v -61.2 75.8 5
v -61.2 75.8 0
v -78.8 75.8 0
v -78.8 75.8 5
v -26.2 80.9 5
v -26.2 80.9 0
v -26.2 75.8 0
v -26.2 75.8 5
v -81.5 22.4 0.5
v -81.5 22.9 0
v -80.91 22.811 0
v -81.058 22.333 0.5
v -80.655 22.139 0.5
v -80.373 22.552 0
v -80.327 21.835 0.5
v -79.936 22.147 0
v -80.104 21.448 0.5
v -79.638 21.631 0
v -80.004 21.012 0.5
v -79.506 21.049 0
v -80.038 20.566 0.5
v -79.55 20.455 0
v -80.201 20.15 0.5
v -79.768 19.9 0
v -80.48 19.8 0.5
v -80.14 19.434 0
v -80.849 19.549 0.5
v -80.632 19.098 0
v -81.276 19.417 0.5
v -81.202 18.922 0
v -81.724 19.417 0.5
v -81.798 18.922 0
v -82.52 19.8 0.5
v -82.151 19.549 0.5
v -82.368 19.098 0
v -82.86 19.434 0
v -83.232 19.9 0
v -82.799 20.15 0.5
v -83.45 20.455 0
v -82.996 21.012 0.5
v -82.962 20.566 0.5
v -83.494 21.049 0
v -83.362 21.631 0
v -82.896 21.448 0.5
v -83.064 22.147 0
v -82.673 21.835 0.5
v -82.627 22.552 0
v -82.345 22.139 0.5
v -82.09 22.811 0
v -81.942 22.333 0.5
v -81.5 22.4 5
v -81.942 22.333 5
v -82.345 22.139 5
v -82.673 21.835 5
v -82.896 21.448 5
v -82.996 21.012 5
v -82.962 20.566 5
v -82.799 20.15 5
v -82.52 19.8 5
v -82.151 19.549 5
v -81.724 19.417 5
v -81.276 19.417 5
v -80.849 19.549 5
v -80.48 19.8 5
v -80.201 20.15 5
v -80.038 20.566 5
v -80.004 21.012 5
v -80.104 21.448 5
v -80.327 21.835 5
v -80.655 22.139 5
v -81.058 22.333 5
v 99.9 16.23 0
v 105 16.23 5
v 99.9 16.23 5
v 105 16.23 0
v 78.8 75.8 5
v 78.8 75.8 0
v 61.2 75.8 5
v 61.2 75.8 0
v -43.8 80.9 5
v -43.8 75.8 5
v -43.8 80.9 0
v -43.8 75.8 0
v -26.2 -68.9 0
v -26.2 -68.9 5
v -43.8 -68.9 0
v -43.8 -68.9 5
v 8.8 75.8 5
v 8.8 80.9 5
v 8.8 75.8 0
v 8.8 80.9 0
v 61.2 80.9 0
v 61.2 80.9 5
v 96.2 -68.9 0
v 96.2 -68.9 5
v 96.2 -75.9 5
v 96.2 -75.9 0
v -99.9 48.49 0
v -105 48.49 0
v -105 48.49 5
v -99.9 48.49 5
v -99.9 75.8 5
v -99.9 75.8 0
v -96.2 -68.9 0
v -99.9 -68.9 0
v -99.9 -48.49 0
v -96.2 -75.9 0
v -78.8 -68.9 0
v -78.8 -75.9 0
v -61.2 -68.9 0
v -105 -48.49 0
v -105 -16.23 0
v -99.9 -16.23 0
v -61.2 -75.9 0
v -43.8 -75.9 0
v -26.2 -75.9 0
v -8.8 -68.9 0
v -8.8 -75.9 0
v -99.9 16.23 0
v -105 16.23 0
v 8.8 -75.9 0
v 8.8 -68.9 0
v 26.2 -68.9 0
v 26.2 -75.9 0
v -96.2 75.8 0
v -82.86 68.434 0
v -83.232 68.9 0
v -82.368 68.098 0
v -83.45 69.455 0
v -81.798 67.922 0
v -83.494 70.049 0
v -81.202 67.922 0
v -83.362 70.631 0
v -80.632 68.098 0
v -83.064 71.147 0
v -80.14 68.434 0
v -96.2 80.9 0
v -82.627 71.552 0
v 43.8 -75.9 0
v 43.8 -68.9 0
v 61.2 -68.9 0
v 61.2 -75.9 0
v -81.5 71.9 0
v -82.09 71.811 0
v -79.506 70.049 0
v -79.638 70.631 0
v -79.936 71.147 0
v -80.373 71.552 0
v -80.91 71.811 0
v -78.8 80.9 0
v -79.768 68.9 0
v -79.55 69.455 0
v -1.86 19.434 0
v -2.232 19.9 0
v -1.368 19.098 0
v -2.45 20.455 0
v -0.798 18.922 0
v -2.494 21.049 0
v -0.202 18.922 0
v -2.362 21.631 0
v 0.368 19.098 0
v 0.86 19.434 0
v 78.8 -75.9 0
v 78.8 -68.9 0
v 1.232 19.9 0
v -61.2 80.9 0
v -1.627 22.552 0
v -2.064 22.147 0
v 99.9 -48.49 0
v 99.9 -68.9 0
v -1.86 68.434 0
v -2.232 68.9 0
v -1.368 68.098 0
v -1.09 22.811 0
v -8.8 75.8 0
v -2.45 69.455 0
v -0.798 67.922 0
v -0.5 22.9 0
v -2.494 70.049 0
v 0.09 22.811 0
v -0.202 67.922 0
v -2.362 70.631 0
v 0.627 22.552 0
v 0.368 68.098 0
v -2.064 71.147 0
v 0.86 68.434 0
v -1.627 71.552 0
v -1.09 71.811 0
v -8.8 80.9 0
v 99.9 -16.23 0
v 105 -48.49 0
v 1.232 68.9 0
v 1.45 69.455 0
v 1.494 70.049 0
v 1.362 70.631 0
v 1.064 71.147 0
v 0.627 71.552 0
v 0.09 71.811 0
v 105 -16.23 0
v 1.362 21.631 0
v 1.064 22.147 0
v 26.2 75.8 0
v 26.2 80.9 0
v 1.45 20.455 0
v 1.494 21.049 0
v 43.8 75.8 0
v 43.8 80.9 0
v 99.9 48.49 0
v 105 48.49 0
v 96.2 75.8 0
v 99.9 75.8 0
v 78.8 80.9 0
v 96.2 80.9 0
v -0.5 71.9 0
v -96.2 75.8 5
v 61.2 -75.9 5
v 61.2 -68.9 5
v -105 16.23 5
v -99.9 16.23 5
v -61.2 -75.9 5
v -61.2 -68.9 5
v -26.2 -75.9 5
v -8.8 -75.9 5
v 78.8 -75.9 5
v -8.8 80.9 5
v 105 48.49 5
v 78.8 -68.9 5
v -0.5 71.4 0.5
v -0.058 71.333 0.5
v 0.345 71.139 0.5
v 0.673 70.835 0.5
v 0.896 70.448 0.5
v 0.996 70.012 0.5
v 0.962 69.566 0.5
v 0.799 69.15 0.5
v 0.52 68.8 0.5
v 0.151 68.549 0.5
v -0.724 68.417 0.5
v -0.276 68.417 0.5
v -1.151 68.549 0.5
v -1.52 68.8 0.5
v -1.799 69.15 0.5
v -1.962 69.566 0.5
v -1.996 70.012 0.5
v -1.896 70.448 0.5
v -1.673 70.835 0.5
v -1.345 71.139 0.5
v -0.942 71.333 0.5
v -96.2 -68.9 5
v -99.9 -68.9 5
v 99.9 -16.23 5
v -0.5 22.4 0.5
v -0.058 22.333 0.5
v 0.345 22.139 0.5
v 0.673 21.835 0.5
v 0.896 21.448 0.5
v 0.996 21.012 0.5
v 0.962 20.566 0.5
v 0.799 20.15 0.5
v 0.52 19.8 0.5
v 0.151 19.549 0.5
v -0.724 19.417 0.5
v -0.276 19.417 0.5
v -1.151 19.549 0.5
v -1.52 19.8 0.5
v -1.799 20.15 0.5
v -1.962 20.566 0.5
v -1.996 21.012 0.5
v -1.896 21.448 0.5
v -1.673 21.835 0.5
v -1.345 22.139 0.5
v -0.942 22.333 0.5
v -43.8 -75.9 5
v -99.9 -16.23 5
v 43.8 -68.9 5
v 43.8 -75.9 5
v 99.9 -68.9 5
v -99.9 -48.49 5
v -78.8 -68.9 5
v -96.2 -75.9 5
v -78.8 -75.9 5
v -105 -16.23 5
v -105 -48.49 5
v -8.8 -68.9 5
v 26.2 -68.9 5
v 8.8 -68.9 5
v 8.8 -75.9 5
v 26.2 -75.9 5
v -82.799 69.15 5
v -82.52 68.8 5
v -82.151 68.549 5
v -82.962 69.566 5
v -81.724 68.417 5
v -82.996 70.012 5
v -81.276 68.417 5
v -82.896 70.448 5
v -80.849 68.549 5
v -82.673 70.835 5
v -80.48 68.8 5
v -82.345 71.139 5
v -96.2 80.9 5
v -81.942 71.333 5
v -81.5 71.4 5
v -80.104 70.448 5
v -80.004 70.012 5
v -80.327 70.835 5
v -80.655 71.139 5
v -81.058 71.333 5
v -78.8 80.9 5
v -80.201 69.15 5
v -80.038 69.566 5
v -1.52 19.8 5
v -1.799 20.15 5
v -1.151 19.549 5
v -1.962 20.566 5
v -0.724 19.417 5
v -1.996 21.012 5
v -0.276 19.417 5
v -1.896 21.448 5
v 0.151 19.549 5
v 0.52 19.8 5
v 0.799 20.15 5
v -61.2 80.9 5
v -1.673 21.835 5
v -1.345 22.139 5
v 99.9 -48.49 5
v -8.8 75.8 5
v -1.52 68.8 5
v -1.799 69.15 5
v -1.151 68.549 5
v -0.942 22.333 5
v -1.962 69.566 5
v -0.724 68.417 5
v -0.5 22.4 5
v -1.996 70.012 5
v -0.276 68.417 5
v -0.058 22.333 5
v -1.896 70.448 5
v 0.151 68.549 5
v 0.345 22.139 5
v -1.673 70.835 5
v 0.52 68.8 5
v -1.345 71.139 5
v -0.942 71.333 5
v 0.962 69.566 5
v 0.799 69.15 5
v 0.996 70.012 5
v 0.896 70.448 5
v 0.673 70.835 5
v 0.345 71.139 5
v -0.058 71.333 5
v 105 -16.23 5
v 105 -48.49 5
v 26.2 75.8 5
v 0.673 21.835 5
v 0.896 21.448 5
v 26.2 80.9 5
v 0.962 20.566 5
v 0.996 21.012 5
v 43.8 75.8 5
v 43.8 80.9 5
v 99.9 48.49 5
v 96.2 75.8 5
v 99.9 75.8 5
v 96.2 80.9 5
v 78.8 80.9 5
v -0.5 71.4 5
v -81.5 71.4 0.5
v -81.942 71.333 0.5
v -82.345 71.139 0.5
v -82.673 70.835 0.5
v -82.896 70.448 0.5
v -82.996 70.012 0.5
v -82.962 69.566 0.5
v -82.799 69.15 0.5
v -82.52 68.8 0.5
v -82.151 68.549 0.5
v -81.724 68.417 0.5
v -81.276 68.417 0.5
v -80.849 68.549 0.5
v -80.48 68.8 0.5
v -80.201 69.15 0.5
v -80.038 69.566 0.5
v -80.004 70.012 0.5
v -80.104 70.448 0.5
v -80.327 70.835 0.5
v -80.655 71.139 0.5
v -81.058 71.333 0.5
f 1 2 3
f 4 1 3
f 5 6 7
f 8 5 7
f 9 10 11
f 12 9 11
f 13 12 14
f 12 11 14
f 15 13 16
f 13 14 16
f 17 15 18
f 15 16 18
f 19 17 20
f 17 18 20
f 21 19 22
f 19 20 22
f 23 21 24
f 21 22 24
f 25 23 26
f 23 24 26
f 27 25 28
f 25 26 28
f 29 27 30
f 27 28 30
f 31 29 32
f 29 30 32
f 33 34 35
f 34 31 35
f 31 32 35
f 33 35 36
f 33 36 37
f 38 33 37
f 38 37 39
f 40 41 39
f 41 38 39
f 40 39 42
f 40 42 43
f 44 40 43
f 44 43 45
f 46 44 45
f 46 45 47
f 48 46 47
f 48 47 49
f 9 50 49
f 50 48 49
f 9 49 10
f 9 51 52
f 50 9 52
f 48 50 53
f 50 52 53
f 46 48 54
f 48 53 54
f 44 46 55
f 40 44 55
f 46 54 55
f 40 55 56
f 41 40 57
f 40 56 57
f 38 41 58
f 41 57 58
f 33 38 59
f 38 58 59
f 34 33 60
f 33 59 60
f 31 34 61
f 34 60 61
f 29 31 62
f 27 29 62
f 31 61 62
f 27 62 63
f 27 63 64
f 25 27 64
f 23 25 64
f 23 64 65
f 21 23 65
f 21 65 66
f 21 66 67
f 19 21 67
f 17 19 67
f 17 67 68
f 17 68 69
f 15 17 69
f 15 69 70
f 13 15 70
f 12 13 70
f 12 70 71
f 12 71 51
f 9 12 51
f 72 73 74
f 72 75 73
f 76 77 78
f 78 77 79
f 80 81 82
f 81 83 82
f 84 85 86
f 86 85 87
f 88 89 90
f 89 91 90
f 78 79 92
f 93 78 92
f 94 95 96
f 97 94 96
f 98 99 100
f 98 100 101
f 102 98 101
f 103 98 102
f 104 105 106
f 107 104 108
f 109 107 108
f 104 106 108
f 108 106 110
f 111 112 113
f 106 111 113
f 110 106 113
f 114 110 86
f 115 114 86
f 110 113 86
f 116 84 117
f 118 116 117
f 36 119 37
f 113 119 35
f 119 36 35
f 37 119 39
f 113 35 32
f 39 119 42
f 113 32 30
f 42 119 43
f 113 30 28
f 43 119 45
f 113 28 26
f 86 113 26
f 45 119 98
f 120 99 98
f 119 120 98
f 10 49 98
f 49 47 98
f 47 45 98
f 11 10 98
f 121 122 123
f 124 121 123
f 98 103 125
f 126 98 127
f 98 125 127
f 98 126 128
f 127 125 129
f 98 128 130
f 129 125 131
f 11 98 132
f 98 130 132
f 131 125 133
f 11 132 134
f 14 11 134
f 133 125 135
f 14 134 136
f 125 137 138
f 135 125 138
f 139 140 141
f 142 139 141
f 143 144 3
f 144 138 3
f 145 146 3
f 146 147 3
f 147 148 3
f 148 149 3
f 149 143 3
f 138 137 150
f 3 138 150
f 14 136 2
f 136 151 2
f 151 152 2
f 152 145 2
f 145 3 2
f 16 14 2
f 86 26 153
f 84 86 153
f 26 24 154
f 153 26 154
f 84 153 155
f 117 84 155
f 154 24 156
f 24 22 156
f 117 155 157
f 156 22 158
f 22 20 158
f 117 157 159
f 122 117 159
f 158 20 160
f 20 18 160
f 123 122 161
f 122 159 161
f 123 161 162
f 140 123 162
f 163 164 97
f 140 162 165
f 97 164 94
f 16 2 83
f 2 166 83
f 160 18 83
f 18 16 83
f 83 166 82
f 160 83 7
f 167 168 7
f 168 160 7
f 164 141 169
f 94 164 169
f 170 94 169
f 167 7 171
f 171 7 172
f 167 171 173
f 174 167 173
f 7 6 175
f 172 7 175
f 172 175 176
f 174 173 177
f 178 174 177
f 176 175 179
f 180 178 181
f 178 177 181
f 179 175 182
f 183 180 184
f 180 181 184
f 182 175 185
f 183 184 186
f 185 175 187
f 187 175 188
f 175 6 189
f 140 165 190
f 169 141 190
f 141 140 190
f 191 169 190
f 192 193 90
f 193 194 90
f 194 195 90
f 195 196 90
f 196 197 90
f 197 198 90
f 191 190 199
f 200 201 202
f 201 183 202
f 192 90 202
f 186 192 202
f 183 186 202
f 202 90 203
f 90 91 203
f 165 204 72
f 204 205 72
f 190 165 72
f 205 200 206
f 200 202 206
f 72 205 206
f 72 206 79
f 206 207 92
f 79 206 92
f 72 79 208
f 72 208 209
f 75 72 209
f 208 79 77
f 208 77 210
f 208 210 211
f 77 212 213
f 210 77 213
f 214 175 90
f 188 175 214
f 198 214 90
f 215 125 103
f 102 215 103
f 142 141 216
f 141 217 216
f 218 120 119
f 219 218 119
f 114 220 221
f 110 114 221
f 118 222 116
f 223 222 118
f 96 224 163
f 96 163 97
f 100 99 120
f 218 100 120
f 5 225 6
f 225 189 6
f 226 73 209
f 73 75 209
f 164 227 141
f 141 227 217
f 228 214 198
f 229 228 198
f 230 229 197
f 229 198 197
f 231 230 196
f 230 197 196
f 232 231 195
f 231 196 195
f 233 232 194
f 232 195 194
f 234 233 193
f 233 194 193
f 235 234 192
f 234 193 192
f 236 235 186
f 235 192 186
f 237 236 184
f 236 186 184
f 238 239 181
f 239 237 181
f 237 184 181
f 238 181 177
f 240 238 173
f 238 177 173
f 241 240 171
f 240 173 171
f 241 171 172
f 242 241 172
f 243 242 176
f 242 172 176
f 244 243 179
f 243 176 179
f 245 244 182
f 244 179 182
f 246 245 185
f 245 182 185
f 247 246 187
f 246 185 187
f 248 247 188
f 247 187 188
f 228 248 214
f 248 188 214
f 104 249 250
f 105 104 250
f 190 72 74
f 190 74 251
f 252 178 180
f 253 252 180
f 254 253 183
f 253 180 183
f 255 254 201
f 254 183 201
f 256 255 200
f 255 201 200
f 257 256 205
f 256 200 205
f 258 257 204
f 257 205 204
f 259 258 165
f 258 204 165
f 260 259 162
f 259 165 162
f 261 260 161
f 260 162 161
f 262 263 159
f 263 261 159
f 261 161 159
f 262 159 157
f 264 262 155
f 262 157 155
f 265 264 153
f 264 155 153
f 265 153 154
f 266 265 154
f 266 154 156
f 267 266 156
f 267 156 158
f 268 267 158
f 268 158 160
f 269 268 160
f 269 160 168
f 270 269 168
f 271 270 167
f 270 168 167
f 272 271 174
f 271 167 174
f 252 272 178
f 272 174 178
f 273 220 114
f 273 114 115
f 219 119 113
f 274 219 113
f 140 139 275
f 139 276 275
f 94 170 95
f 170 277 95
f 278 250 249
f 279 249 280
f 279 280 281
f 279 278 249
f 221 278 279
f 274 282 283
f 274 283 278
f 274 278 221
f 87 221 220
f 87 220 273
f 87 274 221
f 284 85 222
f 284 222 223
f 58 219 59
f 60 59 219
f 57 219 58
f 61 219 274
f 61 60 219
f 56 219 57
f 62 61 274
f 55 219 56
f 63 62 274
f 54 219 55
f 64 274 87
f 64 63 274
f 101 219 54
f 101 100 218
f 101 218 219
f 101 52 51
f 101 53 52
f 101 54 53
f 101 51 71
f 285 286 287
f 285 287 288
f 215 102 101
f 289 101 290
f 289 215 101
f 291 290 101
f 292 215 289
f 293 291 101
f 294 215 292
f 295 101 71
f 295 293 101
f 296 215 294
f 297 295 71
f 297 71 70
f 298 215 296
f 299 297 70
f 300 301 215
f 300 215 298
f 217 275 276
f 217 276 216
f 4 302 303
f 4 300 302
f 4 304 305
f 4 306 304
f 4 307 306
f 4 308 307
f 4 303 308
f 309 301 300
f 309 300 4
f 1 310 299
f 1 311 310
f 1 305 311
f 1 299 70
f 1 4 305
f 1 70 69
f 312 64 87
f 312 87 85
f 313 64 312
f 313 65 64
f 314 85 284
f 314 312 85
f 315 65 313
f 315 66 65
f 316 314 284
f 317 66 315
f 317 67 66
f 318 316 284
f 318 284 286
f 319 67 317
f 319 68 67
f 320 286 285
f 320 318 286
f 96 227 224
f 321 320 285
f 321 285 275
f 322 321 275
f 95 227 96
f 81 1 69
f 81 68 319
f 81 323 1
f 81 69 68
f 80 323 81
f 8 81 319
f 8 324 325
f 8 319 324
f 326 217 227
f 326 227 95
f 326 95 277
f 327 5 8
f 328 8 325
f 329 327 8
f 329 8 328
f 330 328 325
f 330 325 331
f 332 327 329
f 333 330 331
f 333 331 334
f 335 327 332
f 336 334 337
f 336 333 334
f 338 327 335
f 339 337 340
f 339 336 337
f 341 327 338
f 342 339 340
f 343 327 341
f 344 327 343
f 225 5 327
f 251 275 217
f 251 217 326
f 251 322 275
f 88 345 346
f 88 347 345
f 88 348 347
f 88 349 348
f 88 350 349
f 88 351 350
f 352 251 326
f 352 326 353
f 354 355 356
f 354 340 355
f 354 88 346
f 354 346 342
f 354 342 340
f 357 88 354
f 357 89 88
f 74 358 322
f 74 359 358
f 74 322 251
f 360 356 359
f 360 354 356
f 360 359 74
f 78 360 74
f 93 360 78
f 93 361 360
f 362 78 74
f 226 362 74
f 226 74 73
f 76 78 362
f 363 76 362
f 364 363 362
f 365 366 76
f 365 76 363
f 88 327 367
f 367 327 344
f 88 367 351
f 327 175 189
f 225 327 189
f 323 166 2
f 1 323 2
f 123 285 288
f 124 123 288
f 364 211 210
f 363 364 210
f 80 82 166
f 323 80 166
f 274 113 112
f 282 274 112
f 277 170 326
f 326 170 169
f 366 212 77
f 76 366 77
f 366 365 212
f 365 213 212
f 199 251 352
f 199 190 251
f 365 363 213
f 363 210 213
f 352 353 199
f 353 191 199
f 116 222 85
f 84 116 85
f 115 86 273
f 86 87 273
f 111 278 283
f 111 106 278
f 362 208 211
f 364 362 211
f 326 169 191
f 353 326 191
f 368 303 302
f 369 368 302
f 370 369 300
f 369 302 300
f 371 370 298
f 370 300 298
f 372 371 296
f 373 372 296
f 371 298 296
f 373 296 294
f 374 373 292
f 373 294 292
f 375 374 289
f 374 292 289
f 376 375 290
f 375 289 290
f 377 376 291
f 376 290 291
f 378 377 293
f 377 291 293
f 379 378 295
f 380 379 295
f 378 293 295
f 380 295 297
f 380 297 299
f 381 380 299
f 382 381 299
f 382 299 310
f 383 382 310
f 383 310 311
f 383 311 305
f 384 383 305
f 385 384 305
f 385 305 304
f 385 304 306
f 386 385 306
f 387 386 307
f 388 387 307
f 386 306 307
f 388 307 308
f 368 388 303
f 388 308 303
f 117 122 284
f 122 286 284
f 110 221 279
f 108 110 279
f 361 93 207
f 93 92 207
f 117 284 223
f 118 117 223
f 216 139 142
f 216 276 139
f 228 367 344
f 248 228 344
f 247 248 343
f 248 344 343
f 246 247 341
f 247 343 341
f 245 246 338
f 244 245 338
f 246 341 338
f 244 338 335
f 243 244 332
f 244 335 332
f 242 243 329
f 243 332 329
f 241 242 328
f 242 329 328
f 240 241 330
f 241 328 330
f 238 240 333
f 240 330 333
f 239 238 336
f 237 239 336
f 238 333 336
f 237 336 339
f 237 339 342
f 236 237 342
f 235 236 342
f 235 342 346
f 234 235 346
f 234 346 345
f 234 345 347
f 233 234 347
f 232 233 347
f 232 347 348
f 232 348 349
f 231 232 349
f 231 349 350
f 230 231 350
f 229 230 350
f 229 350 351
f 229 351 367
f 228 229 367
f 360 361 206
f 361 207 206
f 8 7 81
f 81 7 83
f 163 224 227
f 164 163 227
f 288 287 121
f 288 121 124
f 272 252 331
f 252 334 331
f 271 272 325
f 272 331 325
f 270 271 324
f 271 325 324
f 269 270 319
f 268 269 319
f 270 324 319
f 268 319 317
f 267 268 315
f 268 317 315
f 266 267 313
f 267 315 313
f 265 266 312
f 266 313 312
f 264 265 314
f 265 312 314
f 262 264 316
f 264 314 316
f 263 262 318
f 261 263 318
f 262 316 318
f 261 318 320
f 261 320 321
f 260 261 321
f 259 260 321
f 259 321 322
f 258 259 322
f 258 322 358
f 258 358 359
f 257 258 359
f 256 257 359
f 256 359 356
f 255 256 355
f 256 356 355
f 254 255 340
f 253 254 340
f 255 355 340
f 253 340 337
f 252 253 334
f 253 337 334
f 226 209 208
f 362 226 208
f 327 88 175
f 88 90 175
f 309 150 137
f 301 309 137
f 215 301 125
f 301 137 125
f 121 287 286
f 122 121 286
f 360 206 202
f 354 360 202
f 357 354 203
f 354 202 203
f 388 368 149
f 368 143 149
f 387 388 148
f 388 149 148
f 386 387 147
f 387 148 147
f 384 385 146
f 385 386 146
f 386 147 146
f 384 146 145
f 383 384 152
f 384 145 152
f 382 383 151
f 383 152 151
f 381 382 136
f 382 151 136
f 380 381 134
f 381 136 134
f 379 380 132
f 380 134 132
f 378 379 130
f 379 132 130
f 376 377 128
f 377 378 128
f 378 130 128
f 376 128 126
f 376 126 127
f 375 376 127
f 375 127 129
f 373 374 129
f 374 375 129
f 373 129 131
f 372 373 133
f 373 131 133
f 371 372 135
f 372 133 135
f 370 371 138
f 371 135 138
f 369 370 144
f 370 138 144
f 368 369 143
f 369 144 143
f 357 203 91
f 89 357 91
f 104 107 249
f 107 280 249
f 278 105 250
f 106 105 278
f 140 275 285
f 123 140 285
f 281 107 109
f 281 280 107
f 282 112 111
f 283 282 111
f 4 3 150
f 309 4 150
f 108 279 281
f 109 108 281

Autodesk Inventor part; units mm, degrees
ref_plane "YZ Plane" through (0, 0, 0) normal (1, 0, 0) x (0, 1, 0)
ref_plane "XZ Plane" through (0, 0, 0) normal (0, 1, 0) x (-1, 0, 0)
ref_plane "XY Plane" through (0, 0, 0) normal (0, 0, 1) x (1, 0, 0)
sketch "Sketch1" plane through (0, 0, 0) normal (0, 0, 1) x (1, 0, 0)
  line L0 (-105, -80.9) -> (105, -80.9)
  line L1 (105, -80.9) -> (105, 80.9)
  line L2 (105, 80.9) -> (-105, 80.9)
  line L3 (-105, 80.9) -> (-105, -80.9)
  line L4 (-105, -80.9) -> (105, 80.9) construction
  line L5 (105, -80.9) -> (-105, 80.9) construction
  point P0 (0, 0)
  dimension "d0" = 210
  dimension "d1" = 161.8
extrude "Extrusion1" add sketch "Sketch1" along normal blind 5
sketch "Sketch3" plane through (0, 0, 0) normal (0, 0, -1) x (-1, 0, 0)
  line L0 (0.5, 69.9) -> (81.5, 69.9)
  line L1 (81.5, 69.9) -> (81.5, 20.9)
  line L2 (81.5, 20.9) -> (0.5, 20.9)
  line L3 (0.5, 20.9) -> (0.5, 69.9)
  line L4 (105, 80.9) -> (105, -80.9) projected
  line L5 (-105, 80.9) -> (105, 80.9) projected
  point P0 (0, 0)
  dimension "d20" = 49
  dimension "d21" = 81
  dimension "d22" = 23.5
  dimension "d23" = 11
hole "Hole2" at (-0.5, 69.9, 0) at (-81.5, 69.9, 0) at (-0.5, 20.9, 0) at (-81.5, 20.9, 0) direction (0, 0, 1) diameter 3 end through all countersink diameter 4 countersink angle 90
sketch "Sketch4" plane through (0, 0, 0) normal (0, 0, -1) x (-1, 0, 0)
  line L0 (-105, 80.9) -> (105, 80.9) projected
  circle A0 centre (81.5, 20.9) radius 2 projected
  circle A1 centre (0.5, 20.9) radius 2 projected
  circle A2 centre (81.5, 69.9) radius 2 projected
  circle A3 centre (0.5, 69.9) radius 2 projected
  line L1 (-105, -80.9) -> (-105, 80.9) projected
  line L2 (105, -80.9) -> (-105, -80.9) projected
  line L3 (105, 80.9) -> (105, -80.9) projected
  line L4 (-105, 80.9) -> (105, 80.9) projected
  line L5 (8.8, 80.9) -> (-8.8, 80.9)
  line L6 (-8.8, 80.9) -> (-8.8, 75.8)
  line L7 (-8.8, 75.8) -> (8.8, 75.8)
  line L8 (8.8, 75.8) -> (8.8, 80.9)
  line L9 (-26.2, 75.8) -> (-26.2, 80.9)
  line L10 (-26.2, 80.9) -> (-43.8, 80.9)
  line L11 (-43.8, 80.9) -> (-43.8, 75.8)
  line L12 (-43.8, 75.8) -> (-26.2, 75.8)
  line L13 (-61.2, 75.8) -> (-61.2, 80.9)
  line L14 (-61.2, 80.9) -> (-78.8, 80.9)
  line L15 (-78.8, 80.9) -> (-78.8, 75.8)
  line L16 (-78.8, 75.8) -> (-61.2, 75.8)
  line L17 (-96.2, 75.8) -> (-96.2, 80.9)
  line L18 (-96.2, 80.9) -> (-113.8, 80.9)
  line L19 (-113.8, 80.9) -> (-113.8, 75.8)
  line L20 (-113.8, 75.8) -> (-96.2, 75.8)
  line L21 (26.2, 80.9) -> (26.2, 75.8)
  line L22 (43.8, 80.9) -> (26.2, 80.9)
  line L23 (43.8, 75.8) -> (43.8, 80.9)
  line L24 (26.2, 75.8) -> (43.8, 75.8)
  line L25 (61.2, 80.9) -> (61.2, 75.8)
  line L26 (78.8, 80.9) -> (61.2, 80.9)
  line L27 (78.8, 75.8) -> (78.8, 80.9)
  line L28 (61.2, 75.8) -> (78.8, 75.8)
  line L29 (96.2, 80.9) -> (96.2, 75.8)
  line L30 (113.8, 80.9) -> (96.2, 80.9)
  line L31 (113.8, 75.8) -> (113.8, 80.9)
  line L32 (96.2, 75.8) -> (113.8, 75.8)
  line L33 (0, 0) -> (105, 0) construction
  point P0 (0, 75.8)
  point P1 (8.8, 80.9)
  point P2 (-8.8, 80.9)
  point P3 (0, 80.9)
  point P4 (-35, 80.9)
  point P5 (-35, 75.8)
  point P6 (-70, 80.9)
  point P7 (-70, 75.8)
  point P8 (-105, 80.9)
  point P9 (-105, 75.8)
  point P10 (35, 75.8)
  point P11 (35, 80.9)
  point P12 (70, 75.8)
  point P13 (70, 80.9)
  point P14 (105, 75.8)
  point P15 (105, 80.9)
  point P16 (-105, 75.8)
  point P17 (105, 75.8)
  dimension "d43" = 210
  dimension "d44" = 17.6
  dimension "d45" = 5.1
  dimension "d48" = 35
  dimension "d55" = 35
extrude "Extrusion2" cut sketch "Sketch4" against normal blind 10 contours L0 L17 L20 L1 | L0 L13 L16 L15 | L0 L9 L12 L11 | L32 L29 L0 L3 | L0 L8 L7 L6 | L27 L28 L25 L0 | L0 L23 L24 L21
sketch "Sketch5" plane through (0, 0, 0) normal (0, 0, -1) x (-1, 0, 0)
  line L0 (-105, -80.9) -> (-105, 80.9) projected
  line L1 (-105, 80.9) -> (26.2, 80.9) projected
  line L2 (-105, 48.49) -> (-99.9, 48.49)
  line L3 (-99.9, 48.49) -> (-99.9, 80.9)
  line L4 (-99.9, 80.9) -> (-105, 80.9)
  line L5 (-105, 80.9) -> (-105, 48.49)
  line L6 (-105, 16.23) -> (-99.9, 16.23)
  line L7 (-99.9, 16.23) -> (-99.9, -16.23)
  line L8 (-99.9, -16.23) -> (-105, -16.23)
  line L9 (-105, -16.23) -> (-105, 16.23)
  line L10 (-105, -80.9) -> (-99.9, -80.9)
  line L11 (-99.9, -80.9) -> (-99.9, -48.49)
  line L12 (-99.9, -48.49) -> (-105, -48.49)
  line L13 (-105, -48.49) -> (-105, -80.9)
  line L14 (-102.45, 48.49) -> (-102.45, 16.23) construction
  line L15 (-102.45, -48.49) -> (-102.45, -16.23) construction
  line L16 (0, 0) -> (0, 62.5) construction
  line L17 (105, -80.9) -> (105, 80.9)
  line L18 (105, 80.9) -> (96.35, 80.9)
  line L19 (105, 48.49) -> (99.9, 48.49)
  line L20 (99.9, 48.49) -> (99.9, 80.9)
  line L21 (99.9, 80.9) -> (105, 80.9)
  line L22 (105, 80.9) -> (105, 48.49)
  line L23 (105, 16.23) -> (99.9, 16.23)
  line L24 (99.9, 16.23) -> (99.9, -16.23)
  line L25 (99.9, -16.23) -> (105, -16.23)
  line L26 (105, -16.23) -> (105, 16.23)
  line L27 (105, -80.9) -> (99.9, -80.9)
  line L28 (99.9, -80.9) -> (99.9, -48.49)
  line L29 (99.9, -48.49) -> (105, -48.49)
  line L30 (105, -48.49) -> (105, -80.9)
  line L31 (102.45, 48.49) -> (102.45, 16.23) construction
  line L32 (102.45, -48.49) -> (102.45, -16.23) construction
  point P0 (-96.35, 80.9)
  point P1 (-99.9, 0)
  point P2 (-105, 0)
  point P3 (99.9, 0)
  point P4 (105, 0)
  point P5 (-105, -48.49)
  point P6 (-105, 16.23)
  point P7 (-105, -16.23)
  dimension "d37" = 32.46
  dimension "d38" = 161.8
  dimension "d39" = 5.1
  dimension "d40" = 32.26
extrude "Extrusion3" cut sketch "Sketch5" against normal blind 10
sketch "Sketch7" plane through (0, 0, 5) normal (0, 0, 1) x (1, 0, 0)
  line L0 (-105, -48.49) -> (105, -48.49)
  line L1 (8.8, -68.9) -> (-8.8, -68.9)
  line L2 (-8.8, -68.9) -> (-8.8, -80.9)
  line L3 (-8.8, -80.9) -> (8.8, -80.9)
  line L4 (8.8, -80.9) -> (8.8, -68.9)
  line L5 (-26.2, -80.9) -> (-26.2, -68.9)
  line L6 (-26.2, -68.9) -> (-43.8, -68.9)
  line L7 (-43.8, -68.9) -> (-43.8, -80.9)
  line L8 (-43.8, -80.9) -> (-26.2, -80.9)
  line L9 (-61.2, -80.9) -> (-61.2, -68.9)
  line L10 (-61.2, -68.9) -> (-78.8, -68.9)
  line L11 (-78.8, -68.9) -> (-78.8, -80.9)
  line L12 (-78.8, -80.9) -> (-61.2, -80.9)
  line L13 (-96.2, -80.9) -> (-96.2, -68.9)
  line L14 (-96.2, -68.9) -> (-113.8, -68.9)
  line L15 (-113.8, -68.9) -> (-113.8, -80.9)
  line L16 (-113.8, -80.9) -> (-96.2, -80.9)
  line L17 (26.2, -68.9) -> (26.2, -80.9)
  line L18 (43.8, -68.9) -> (26.2, -68.9)
  line L19 (43.8, -80.9) -> (43.8, -68.9)
  line L20 (26.2, -80.9) -> (43.8, -80.9)
  line L21 (61.2, -68.9) -> (61.2, -80.9)
  line L22 (78.8, -68.9) -> (61.2, -68.9)
  line L23 (78.8, -80.9) -> (78.8, -68.9)
  line L24 (61.2, -80.9) -> (78.8, -80.9)
  line L25 (96.2, -68.9) -> (96.2, -80.9)
  line L26 (113.8, -68.9) -> (96.2, -68.9)
  line L27 (113.8, -80.9) -> (113.8, -68.9)
  line L28 (96.2, -80.9) -> (113.8, -80.9)
  line L29 (-99.9, -80.9) -> (99.9, -80.9) projected
  point P0 (0, 0)
  point P1 (0, -80.9)
  point P2 (0, -48.49)
  point P3 (-35, -48.49)
  point P4 (-35, -80.9)
  point P5 (-70, -48.49)
  point P6 (-70, -80.9)
  point P7 (-105, -48.49)
  point P8 (-105, -80.9)
  point P9 (35, -80.9)
  point P10 (35, -48.49)
  point P11 (70, -80.9)
  point P12 (70, -48.49)
  point P13 (105, -80.9)
  point P14 (105, -48.49)
  point P15 (0, -80.9)
  point P16 (105, -48.49)
  dimension "d68" = 210
  dimension "d69" = 17.6
  dimension "d70" = 12
  dimension "d71" = 35
  dimension "d72" = 35
extrude "Extrusion4" cut sketch "Sketch7" against normal blind 10
sketch "Sketch8" plane through (0, 0, 5) normal (0, 0, 1) x (1, 0, 0)
  line L0 (-96.2, -68.9) -> (-96.2, -80.9) projected
  line L1 (-96.2, -75.9) -> (96.2, -75.9)
  line L2 (96.2, -80.9) -> (96.2, -68.9) projected
  line L3 (-96.2, -80.9) -> (-78.8, -80.9) projected
  line L4 (61.2, -80.9) -> (61.2, -68.9) projected
  line L5 (61.2, -68.9) -> (78.8, -68.9) projected
  line L6 (78.8, -68.9) -> (78.8, -80.9) projected
  line L7 (78.8, -80.9) -> (96.2, -80.9) projected
  line L8 (96.2, -80.9) -> (96.2, -68.9) projected
  line L9 (96.2, -68.9) -> (99.9, -68.9) projected
  line L10 (99.9, -68.9) -> (99.9, -48.49) projected
  line L11 (99.9, -48.49) -> (105, -48.49) projected
  line L12 (105, -48.49) -> (105, -16.23) projected
  line L13 (105, -16.23) -> (99.9, -16.23) projected
  line L14 (99.9, -16.23) -> (99.9, 16.23) projected
  line L15 (99.9, 16.23) -> (105, 16.23) projected
  line L16 (105, 16.23) -> (105, 48.49) projected
  line L17 (105, 48.49) -> (99.9, 48.49) projected
  line L18 (99.9, 48.49) -> (99.9, 75.8) projected
  line L19 (99.9, 75.8) -> (96.2, 75.8) projected
  line L20 (96.2, 75.8) -> (96.2, 80.9) projected
  line L21 (96.2, 80.9) -> (78.8, 80.9) projected
  line L22 (78.8, 80.9) -> (78.8, 75.8) projected
  line L23 (78.8, 75.8) -> (61.2, 75.8) projected
  line L24 (61.2, 75.8) -> (61.2, 80.9) projected
  line L25 (61.2, 80.9) -> (43.8, 80.9) projected
  line L26 (43.8, 80.9) -> (43.8, 75.8) projected
  line L27 (43.8, 75.8) -> (26.2, 75.8) projected
  line L28 (26.2, 75.8) -> (26.2, 80.9) projected
  line L29 (26.2, 80.9) -> (8.8, 80.9) projected
  line L30 (8.8, 80.9) -> (8.8, 75.8) projected
  line L31 (8.8, 75.8) -> (-8.8, 75.8) projected
  line L32 (-8.8, 75.8) -> (-8.8, 80.9) projected
  line L33 (-8.8, 80.9) -> (-26.2, 80.9) projected
  line L34 (-26.2, 80.9) -> (-26.2, 75.8) projected
  line L35 (-26.2, 75.8) -> (-43.8, 75.8) projected
  line L36 (-43.8, 75.8) -> (-43.8, 80.9) projected
  line L37 (-43.8, 80.9) -> (-61.2, 80.9) projected
  line L38 (-61.2, 80.9) -> (-61.2, 75.8) projected
  line L39 (-61.2, 75.8) -> (-78.8, 75.8) projected
  line L40 (-78.8, 75.8) -> (-78.8, 80.9) projected
  line L41 (-78.8, 80.9) -> (-96.2, 80.9) projected
  line L42 (-96.2, 80.9) -> (-96.2, 75.8) projected
  line L43 (-96.2, 75.8) -> (-99.9, 75.8) projected
  line L44 (-99.9, 75.8) -> (-99.9, 48.49) projected
  line L45 (-99.9, 48.49) -> (-105, 48.49) projected
  line L46 (-105, 48.49) -> (-105, 16.23) projected
  line L47 (-105, 16.23) -> (-99.9, 16.23) projected
  line L48 (-99.9, 16.23) -> (-99.9, -16.23) projected
  line L49 (-99.9, -16.23) -> (-105, -16.23) projected
  line L50 (-105, -16.23) -> (-105, -48.49) projected
  line L51 (-105, -48.49) -> (-99.9, -48.49) projected
  line L52 (-99.9, -48.49) -> (-99.9, -68.9) projected
  line L53 (-99.9, -68.9) -> (-96.2, -68.9) projected
  line L54 (-96.2, -68.9) -> (-96.2, -80.9) projected
  line L55 (-96.2, -80.9) -> (-78.8, -80.9) projected
  line L56 (-78.8, -80.9) -> (-78.8, -68.9) projected
  line L57 (-78.8, -68.9) -> (-61.2, -68.9) projected
  line L58 (-61.2, -68.9) -> (-61.2, -80.9) projected
  line L59 (-61.2, -80.9) -> (-43.8, -80.9) projected
  line L60 (-43.8, -80.9) -> (-43.8, -68.9) projected
  line L61 (-43.8, -68.9) -> (-26.2, -68.9) projected
  line L62 (-26.2, -68.9) -> (-26.2, -80.9) projected
  line L63 (-26.2, -80.9) -> (-8.8, -80.9) projected
  line L64 (-8.8, -80.9) -> (-8.8, -68.9) projected
  line L65 (-8.8, -68.9) -> (8.8, -68.9) projected
  line L66 (8.8, -68.9) -> (8.8, -80.9) projected
  line L67 (8.8, -80.9) -> (26.2, -80.9) projected
  line L68 (26.2, -80.9) -> (26.2, -68.9) projected
  line L69 (26.2, -68.9) -> (43.8, -68.9) projected
  line L70 (43.8, -68.9) -> (43.8, -80.9) projected
  line L71 (43.8, -80.9) -> (61.2, -80.9) projected
  point P0 (0, 0)
  point P1 (-78.8, -75.9)
  point P2 (78.8, -75.9)
  point P3 (-43.8, -75.9)
  point P4 (-61.2, -75.9)
  point P5 (-8.8, -75.9)
  point P6 (-26.2, -75.9)
  point P7 (61.2, -75.9)
  point P8 (43.8, -75.9)
  point P9 (26.2, -75.9)
  point P10 (8.8, -75.9)
  dimension "d77" = 5
extrude "Extrusion5" cut sketch "Sketch8" against normal blind 10 contours L1 L56 L3 L0 | L1 L60 L59 L58 | L1 L64 L63 L62 | L1 L68 L67 L66 | L68 L69 L70 L1 | L1 L4 L71 L70 | L1 L2 L7 L6
equation "\"d48\" = 0.166667 * d43"
equation "\"d55\" = 0.166667 * d43"
equation "\"d71\" = 0.166667 * d68"
equation "\"d72\" = 0.166667 * d68"
properties part number "FloorPlate_1" material "MDF Medium Density Fiberboard"
